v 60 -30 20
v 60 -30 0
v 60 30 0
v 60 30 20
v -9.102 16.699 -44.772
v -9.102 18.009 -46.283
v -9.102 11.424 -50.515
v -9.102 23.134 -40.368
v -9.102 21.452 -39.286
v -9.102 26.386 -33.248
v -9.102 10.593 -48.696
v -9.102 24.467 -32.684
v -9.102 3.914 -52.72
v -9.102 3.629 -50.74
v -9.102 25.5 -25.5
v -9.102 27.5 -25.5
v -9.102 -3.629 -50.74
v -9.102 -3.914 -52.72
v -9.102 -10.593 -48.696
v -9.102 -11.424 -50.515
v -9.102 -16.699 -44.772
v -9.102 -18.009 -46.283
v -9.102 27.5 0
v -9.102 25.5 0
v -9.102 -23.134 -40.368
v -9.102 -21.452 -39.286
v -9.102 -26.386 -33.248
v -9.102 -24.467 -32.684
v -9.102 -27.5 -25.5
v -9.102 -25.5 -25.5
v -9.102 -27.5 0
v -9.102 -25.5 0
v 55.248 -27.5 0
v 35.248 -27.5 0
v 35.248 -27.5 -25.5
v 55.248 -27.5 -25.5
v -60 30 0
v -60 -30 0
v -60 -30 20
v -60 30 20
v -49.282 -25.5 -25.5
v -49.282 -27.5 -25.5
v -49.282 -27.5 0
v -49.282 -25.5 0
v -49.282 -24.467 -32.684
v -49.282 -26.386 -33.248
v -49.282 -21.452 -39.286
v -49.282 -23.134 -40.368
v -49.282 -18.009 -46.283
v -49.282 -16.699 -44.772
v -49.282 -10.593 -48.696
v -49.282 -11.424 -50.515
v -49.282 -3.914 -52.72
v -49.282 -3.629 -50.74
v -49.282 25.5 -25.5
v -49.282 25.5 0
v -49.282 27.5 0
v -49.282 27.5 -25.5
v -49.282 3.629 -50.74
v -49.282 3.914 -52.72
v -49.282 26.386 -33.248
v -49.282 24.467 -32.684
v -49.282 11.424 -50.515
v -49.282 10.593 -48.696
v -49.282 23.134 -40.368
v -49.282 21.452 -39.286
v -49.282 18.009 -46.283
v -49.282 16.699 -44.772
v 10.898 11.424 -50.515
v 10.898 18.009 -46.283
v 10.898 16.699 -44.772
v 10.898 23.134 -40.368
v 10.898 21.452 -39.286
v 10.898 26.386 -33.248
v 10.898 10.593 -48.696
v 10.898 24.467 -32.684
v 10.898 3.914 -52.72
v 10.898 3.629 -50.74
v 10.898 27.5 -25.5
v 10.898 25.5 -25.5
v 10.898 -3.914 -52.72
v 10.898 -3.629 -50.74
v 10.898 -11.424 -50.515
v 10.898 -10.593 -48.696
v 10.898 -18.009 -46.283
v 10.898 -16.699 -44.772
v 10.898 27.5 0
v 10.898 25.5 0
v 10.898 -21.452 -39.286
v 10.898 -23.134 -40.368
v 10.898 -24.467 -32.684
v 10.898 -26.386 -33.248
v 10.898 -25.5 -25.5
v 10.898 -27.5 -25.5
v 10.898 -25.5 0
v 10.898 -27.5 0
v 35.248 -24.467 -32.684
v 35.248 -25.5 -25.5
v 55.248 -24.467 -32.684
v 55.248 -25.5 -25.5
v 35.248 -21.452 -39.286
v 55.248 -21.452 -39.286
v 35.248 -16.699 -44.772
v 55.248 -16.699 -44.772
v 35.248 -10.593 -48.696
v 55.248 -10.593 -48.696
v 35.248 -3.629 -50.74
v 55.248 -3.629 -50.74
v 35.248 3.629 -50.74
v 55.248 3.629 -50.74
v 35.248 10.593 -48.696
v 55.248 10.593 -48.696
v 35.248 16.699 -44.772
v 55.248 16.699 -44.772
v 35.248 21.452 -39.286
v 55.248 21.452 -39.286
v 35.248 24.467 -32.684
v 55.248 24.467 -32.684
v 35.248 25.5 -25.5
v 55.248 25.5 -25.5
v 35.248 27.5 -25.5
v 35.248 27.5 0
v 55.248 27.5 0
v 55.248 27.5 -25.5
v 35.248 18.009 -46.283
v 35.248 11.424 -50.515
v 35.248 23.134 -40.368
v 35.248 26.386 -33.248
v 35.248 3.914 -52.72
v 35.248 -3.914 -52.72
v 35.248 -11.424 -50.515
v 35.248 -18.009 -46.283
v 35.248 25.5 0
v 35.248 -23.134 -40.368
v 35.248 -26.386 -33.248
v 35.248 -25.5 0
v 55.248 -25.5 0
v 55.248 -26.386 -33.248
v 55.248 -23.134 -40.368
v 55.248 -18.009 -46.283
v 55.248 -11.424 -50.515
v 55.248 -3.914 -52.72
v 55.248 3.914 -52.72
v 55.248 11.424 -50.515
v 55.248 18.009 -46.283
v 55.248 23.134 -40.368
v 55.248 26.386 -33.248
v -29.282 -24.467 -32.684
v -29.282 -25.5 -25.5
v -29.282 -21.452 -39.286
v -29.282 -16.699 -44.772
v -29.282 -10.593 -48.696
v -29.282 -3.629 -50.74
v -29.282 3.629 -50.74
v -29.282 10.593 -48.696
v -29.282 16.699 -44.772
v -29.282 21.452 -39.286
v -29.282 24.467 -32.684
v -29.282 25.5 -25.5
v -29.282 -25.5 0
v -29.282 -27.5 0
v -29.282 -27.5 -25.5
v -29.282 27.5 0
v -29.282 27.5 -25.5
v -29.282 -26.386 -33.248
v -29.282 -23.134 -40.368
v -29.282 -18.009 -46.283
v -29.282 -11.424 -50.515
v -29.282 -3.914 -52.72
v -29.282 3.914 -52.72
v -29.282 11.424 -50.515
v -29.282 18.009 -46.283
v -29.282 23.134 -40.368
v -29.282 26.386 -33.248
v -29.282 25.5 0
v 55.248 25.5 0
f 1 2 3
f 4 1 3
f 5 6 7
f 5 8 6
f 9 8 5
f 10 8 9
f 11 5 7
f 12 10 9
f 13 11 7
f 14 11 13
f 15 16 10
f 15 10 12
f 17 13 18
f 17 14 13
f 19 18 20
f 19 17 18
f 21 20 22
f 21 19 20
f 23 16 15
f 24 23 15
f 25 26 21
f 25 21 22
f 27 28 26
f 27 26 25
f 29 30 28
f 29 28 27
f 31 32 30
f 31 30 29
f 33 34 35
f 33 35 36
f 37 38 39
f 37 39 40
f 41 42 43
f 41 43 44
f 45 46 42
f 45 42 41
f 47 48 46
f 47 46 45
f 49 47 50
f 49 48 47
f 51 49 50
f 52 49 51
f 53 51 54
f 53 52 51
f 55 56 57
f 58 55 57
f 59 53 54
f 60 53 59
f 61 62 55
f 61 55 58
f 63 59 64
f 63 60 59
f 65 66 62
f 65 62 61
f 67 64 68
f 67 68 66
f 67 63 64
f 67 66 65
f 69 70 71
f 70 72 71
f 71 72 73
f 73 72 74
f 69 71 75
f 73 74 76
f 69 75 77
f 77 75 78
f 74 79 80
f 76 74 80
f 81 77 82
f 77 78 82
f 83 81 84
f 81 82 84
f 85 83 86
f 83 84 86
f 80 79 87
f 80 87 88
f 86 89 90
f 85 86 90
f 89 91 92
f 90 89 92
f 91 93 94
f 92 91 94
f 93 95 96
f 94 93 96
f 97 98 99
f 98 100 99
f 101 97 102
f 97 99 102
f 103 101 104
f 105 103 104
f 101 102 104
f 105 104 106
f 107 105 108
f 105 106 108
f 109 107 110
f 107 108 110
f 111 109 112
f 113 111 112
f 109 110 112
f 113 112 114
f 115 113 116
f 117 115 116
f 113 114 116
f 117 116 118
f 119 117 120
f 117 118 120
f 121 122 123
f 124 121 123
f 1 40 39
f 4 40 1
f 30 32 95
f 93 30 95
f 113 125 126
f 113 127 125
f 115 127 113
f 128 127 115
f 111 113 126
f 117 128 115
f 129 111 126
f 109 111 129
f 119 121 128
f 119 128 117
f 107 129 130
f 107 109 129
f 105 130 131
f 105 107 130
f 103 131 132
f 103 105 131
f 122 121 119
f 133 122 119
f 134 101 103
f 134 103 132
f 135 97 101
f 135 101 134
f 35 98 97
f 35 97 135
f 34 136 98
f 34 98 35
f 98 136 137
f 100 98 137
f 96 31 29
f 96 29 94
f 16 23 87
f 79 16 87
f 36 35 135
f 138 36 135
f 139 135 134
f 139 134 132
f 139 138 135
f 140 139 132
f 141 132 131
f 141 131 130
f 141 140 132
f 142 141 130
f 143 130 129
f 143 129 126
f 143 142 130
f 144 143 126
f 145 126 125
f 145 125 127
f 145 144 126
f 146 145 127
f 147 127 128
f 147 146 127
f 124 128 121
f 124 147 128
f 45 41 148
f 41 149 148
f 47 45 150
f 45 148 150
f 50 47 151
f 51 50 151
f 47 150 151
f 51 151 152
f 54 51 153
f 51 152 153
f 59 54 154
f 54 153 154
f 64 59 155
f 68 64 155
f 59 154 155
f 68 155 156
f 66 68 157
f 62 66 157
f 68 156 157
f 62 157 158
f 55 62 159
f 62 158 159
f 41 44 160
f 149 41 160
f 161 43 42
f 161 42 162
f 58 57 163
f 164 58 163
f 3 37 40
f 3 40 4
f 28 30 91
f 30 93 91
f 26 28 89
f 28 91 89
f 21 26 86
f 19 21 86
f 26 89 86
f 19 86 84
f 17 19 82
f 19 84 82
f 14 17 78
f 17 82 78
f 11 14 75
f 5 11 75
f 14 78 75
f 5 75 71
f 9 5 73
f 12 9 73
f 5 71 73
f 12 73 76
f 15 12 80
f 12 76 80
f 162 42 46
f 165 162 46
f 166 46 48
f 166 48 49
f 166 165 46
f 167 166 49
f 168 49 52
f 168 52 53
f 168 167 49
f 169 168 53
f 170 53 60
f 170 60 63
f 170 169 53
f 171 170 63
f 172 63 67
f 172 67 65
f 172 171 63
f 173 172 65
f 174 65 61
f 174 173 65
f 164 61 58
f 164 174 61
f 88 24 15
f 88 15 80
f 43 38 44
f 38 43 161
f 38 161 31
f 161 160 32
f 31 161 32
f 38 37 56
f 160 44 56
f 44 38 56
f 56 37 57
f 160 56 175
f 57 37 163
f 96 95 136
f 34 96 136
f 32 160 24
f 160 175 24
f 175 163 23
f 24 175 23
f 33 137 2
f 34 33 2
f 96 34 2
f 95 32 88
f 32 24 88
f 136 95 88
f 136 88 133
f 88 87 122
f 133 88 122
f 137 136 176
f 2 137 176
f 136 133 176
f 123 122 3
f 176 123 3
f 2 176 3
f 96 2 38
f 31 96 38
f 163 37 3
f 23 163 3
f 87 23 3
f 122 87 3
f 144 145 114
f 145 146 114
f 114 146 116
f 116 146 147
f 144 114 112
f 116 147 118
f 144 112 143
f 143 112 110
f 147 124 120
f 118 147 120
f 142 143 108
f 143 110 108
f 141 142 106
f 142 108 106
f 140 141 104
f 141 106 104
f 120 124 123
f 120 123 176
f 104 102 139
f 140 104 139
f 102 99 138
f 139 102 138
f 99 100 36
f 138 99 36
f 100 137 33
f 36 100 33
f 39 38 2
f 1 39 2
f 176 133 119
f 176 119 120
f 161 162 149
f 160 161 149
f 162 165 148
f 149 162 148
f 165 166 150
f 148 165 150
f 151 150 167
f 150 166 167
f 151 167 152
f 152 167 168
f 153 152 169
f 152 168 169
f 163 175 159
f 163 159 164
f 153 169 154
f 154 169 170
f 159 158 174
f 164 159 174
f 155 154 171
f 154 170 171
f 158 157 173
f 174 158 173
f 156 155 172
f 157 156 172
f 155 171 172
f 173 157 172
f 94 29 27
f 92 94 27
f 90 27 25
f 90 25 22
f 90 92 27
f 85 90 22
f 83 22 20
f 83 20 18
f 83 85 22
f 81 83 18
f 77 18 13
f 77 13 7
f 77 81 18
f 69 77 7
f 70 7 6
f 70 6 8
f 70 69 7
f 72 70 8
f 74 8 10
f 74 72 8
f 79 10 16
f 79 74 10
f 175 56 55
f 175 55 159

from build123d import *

# Parameters (mm, degrees)
F0_W      = 120
F0_H      = 60
F1_DEPTH  = 20
F2_W      = 20
F2_H      = 2
F3_DEPTH  = 25.5
F4_W      = 20
F4_H      = 2
F3_FACE_W = 20
F3_FACE_H = 2
F5_ANGLE  = 180


# Not quite as in the source:
# - a feature names something its author has since deleted; it is built from what else it names


with BuildPart() as f1:
    # F0 (on Top) → F1 (new body)
    with BuildSketch(Plane.XY):
        Rectangle(F0_W, F0_H)
    extrude(amount=F1_DEPTH)

    # F2 (on face) → F3 (join)
    with BuildSketch(Plane(origin=(0, 0, 0), x_dir=(1, 0, 0), z_dir=(0, 0, -1))):
        with Locations((-39.2824916542, 26.5)):
            Rectangle(F2_W, F2_H)
        with Locations((-39.2824916542, -26.5)):
            Rectangle(F2_W, F2_H)
        with Locations((0.8980135992, 26.5)):
            Rectangle(F2_W, F2_H)
        with Locations((0.8980135992, -26.5)):
            Rectangle(F2_W, F2_H)
        with Locations((45.2481971681, 26.5)):
            Rectangle(F2_W, F2_H)
        with Locations((45.2481971681, -26.5)):
            Rectangle(F2_W, F2_H)
    extrude(amount=F3_DEPTH)

    # F4 (on face) + F3_face (on face) → F5 (revolve)
    with BuildSketch(Plane(origin=(0, 0, -25.5), x_dir=(1, 0, 0), z_dir=(0, 0, -1))):
        with Locations((-39.2824916542, 26.5)):
            Rectangle(F4_W, F4_H)
    with BuildSketch(Plane(origin=(-39.2824916542, -26.5, -25.5), x_dir=(1, 0, 0), z_dir=(0, 0, -1))):
        with Locations((40.1805052534, 0)):
            Rectangle(F3_FACE_W, F3_FACE_H)
        with Locations((84.5306888223, 0)):
            Rectangle(F3_FACE_W, F3_FACE_H)
    revolve(axis=Axis((1.9900724292, 0, -25.5), (1, 0, 0)), revolution_arc=F5_ANGLE)


solid = f1.part
